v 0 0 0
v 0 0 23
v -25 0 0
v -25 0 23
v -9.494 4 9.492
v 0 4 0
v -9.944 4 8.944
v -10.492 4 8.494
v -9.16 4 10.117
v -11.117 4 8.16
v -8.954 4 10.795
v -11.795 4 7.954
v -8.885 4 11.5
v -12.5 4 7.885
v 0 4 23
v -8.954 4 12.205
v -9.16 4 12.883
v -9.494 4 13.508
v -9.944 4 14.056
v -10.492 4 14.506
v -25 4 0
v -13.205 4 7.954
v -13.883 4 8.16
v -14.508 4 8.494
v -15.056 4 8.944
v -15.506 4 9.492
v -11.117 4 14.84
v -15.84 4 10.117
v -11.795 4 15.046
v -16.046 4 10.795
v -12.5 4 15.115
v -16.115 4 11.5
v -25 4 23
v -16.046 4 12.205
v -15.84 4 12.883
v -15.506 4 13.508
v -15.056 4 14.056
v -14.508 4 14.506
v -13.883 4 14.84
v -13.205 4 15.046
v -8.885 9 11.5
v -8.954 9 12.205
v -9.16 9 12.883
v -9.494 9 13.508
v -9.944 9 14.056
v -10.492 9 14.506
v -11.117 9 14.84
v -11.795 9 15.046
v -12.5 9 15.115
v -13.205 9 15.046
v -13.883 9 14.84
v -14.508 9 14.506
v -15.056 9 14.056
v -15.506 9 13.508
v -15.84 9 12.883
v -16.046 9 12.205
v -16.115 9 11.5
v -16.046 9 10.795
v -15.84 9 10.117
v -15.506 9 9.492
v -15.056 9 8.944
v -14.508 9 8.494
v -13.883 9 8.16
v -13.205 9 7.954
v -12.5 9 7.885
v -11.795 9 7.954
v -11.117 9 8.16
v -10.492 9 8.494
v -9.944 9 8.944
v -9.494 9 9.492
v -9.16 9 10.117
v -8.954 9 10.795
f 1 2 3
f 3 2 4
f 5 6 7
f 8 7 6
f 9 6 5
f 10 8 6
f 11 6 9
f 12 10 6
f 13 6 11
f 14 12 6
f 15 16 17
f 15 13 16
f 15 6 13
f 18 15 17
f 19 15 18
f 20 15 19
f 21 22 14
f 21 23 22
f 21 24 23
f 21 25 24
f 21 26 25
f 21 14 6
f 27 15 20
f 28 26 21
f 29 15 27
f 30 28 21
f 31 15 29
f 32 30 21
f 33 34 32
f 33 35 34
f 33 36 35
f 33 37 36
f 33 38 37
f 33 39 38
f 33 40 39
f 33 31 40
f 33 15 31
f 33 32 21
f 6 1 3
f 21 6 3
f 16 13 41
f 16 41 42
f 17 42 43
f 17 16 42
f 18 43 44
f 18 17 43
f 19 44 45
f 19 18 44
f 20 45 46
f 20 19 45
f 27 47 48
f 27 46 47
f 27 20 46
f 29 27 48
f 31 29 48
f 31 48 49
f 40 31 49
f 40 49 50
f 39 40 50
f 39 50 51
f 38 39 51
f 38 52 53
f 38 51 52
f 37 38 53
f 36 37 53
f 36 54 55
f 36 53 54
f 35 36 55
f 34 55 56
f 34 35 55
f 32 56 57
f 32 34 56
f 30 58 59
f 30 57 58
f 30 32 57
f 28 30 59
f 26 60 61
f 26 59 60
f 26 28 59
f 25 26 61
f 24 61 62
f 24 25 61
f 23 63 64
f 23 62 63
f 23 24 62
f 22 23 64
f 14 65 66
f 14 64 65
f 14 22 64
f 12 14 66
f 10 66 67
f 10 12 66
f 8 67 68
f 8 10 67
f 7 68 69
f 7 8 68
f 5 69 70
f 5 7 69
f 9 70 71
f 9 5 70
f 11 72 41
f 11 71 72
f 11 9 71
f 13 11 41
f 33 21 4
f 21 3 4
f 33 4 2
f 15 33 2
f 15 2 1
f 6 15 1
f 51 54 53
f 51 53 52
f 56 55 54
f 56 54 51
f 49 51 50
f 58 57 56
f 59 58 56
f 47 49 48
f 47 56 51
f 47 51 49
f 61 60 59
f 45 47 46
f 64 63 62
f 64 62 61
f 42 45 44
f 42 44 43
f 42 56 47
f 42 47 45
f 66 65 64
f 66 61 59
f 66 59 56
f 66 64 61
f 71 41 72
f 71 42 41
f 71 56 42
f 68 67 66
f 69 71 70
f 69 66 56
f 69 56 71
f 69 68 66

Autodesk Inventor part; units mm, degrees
ref_plane "YZ Plane" through (0, 0, 0) normal (1, 0, 0) x (0, 1, 0)
ref_plane "XZ Plane" through (0, 0, 0) normal (0, 1, 0) x (-1, 0, 0)
ref_plane "XY Plane" through (0, 0, 0) normal (0, 0, 1) x (1, 0, 0)
sketch "Sketch1" plane through (0, 0, 0) normal (0, 1, 0) x (-1, 0, 0)
  line L0 (25, 23) -> (0, 23)
  line L1 (0, 23) -> (0, 0)
  line L2 (0, 0) -> (25, 0)
  line L3 (25, 0) -> (25, 23)
  dimension "d0" = 25
  dimension "d1" = 23
extrude "Extrusion1" add sketch "Sketch1" along normal blind 4
sketch "Sketch2" plane through (0, 4, 0) normal (0, 1, 0) x (1, 0, 0)
  circle A0 centre (-12.5, -11.5) radius 3.615
  line L0 (-25, 0) -> (-25, -23) projected
  line L1 (-25, -23) -> (0, -23) projected
  point P0 (0, 0)
  dimension "d4" = 7.23
  dimension "d5" = 12.5
  dimension "d6" = 11.5
extrude "Extrusion2" add sketch "Sketch2" along normal blind 5
properties part number "Camera" material "ABS Plastic"
